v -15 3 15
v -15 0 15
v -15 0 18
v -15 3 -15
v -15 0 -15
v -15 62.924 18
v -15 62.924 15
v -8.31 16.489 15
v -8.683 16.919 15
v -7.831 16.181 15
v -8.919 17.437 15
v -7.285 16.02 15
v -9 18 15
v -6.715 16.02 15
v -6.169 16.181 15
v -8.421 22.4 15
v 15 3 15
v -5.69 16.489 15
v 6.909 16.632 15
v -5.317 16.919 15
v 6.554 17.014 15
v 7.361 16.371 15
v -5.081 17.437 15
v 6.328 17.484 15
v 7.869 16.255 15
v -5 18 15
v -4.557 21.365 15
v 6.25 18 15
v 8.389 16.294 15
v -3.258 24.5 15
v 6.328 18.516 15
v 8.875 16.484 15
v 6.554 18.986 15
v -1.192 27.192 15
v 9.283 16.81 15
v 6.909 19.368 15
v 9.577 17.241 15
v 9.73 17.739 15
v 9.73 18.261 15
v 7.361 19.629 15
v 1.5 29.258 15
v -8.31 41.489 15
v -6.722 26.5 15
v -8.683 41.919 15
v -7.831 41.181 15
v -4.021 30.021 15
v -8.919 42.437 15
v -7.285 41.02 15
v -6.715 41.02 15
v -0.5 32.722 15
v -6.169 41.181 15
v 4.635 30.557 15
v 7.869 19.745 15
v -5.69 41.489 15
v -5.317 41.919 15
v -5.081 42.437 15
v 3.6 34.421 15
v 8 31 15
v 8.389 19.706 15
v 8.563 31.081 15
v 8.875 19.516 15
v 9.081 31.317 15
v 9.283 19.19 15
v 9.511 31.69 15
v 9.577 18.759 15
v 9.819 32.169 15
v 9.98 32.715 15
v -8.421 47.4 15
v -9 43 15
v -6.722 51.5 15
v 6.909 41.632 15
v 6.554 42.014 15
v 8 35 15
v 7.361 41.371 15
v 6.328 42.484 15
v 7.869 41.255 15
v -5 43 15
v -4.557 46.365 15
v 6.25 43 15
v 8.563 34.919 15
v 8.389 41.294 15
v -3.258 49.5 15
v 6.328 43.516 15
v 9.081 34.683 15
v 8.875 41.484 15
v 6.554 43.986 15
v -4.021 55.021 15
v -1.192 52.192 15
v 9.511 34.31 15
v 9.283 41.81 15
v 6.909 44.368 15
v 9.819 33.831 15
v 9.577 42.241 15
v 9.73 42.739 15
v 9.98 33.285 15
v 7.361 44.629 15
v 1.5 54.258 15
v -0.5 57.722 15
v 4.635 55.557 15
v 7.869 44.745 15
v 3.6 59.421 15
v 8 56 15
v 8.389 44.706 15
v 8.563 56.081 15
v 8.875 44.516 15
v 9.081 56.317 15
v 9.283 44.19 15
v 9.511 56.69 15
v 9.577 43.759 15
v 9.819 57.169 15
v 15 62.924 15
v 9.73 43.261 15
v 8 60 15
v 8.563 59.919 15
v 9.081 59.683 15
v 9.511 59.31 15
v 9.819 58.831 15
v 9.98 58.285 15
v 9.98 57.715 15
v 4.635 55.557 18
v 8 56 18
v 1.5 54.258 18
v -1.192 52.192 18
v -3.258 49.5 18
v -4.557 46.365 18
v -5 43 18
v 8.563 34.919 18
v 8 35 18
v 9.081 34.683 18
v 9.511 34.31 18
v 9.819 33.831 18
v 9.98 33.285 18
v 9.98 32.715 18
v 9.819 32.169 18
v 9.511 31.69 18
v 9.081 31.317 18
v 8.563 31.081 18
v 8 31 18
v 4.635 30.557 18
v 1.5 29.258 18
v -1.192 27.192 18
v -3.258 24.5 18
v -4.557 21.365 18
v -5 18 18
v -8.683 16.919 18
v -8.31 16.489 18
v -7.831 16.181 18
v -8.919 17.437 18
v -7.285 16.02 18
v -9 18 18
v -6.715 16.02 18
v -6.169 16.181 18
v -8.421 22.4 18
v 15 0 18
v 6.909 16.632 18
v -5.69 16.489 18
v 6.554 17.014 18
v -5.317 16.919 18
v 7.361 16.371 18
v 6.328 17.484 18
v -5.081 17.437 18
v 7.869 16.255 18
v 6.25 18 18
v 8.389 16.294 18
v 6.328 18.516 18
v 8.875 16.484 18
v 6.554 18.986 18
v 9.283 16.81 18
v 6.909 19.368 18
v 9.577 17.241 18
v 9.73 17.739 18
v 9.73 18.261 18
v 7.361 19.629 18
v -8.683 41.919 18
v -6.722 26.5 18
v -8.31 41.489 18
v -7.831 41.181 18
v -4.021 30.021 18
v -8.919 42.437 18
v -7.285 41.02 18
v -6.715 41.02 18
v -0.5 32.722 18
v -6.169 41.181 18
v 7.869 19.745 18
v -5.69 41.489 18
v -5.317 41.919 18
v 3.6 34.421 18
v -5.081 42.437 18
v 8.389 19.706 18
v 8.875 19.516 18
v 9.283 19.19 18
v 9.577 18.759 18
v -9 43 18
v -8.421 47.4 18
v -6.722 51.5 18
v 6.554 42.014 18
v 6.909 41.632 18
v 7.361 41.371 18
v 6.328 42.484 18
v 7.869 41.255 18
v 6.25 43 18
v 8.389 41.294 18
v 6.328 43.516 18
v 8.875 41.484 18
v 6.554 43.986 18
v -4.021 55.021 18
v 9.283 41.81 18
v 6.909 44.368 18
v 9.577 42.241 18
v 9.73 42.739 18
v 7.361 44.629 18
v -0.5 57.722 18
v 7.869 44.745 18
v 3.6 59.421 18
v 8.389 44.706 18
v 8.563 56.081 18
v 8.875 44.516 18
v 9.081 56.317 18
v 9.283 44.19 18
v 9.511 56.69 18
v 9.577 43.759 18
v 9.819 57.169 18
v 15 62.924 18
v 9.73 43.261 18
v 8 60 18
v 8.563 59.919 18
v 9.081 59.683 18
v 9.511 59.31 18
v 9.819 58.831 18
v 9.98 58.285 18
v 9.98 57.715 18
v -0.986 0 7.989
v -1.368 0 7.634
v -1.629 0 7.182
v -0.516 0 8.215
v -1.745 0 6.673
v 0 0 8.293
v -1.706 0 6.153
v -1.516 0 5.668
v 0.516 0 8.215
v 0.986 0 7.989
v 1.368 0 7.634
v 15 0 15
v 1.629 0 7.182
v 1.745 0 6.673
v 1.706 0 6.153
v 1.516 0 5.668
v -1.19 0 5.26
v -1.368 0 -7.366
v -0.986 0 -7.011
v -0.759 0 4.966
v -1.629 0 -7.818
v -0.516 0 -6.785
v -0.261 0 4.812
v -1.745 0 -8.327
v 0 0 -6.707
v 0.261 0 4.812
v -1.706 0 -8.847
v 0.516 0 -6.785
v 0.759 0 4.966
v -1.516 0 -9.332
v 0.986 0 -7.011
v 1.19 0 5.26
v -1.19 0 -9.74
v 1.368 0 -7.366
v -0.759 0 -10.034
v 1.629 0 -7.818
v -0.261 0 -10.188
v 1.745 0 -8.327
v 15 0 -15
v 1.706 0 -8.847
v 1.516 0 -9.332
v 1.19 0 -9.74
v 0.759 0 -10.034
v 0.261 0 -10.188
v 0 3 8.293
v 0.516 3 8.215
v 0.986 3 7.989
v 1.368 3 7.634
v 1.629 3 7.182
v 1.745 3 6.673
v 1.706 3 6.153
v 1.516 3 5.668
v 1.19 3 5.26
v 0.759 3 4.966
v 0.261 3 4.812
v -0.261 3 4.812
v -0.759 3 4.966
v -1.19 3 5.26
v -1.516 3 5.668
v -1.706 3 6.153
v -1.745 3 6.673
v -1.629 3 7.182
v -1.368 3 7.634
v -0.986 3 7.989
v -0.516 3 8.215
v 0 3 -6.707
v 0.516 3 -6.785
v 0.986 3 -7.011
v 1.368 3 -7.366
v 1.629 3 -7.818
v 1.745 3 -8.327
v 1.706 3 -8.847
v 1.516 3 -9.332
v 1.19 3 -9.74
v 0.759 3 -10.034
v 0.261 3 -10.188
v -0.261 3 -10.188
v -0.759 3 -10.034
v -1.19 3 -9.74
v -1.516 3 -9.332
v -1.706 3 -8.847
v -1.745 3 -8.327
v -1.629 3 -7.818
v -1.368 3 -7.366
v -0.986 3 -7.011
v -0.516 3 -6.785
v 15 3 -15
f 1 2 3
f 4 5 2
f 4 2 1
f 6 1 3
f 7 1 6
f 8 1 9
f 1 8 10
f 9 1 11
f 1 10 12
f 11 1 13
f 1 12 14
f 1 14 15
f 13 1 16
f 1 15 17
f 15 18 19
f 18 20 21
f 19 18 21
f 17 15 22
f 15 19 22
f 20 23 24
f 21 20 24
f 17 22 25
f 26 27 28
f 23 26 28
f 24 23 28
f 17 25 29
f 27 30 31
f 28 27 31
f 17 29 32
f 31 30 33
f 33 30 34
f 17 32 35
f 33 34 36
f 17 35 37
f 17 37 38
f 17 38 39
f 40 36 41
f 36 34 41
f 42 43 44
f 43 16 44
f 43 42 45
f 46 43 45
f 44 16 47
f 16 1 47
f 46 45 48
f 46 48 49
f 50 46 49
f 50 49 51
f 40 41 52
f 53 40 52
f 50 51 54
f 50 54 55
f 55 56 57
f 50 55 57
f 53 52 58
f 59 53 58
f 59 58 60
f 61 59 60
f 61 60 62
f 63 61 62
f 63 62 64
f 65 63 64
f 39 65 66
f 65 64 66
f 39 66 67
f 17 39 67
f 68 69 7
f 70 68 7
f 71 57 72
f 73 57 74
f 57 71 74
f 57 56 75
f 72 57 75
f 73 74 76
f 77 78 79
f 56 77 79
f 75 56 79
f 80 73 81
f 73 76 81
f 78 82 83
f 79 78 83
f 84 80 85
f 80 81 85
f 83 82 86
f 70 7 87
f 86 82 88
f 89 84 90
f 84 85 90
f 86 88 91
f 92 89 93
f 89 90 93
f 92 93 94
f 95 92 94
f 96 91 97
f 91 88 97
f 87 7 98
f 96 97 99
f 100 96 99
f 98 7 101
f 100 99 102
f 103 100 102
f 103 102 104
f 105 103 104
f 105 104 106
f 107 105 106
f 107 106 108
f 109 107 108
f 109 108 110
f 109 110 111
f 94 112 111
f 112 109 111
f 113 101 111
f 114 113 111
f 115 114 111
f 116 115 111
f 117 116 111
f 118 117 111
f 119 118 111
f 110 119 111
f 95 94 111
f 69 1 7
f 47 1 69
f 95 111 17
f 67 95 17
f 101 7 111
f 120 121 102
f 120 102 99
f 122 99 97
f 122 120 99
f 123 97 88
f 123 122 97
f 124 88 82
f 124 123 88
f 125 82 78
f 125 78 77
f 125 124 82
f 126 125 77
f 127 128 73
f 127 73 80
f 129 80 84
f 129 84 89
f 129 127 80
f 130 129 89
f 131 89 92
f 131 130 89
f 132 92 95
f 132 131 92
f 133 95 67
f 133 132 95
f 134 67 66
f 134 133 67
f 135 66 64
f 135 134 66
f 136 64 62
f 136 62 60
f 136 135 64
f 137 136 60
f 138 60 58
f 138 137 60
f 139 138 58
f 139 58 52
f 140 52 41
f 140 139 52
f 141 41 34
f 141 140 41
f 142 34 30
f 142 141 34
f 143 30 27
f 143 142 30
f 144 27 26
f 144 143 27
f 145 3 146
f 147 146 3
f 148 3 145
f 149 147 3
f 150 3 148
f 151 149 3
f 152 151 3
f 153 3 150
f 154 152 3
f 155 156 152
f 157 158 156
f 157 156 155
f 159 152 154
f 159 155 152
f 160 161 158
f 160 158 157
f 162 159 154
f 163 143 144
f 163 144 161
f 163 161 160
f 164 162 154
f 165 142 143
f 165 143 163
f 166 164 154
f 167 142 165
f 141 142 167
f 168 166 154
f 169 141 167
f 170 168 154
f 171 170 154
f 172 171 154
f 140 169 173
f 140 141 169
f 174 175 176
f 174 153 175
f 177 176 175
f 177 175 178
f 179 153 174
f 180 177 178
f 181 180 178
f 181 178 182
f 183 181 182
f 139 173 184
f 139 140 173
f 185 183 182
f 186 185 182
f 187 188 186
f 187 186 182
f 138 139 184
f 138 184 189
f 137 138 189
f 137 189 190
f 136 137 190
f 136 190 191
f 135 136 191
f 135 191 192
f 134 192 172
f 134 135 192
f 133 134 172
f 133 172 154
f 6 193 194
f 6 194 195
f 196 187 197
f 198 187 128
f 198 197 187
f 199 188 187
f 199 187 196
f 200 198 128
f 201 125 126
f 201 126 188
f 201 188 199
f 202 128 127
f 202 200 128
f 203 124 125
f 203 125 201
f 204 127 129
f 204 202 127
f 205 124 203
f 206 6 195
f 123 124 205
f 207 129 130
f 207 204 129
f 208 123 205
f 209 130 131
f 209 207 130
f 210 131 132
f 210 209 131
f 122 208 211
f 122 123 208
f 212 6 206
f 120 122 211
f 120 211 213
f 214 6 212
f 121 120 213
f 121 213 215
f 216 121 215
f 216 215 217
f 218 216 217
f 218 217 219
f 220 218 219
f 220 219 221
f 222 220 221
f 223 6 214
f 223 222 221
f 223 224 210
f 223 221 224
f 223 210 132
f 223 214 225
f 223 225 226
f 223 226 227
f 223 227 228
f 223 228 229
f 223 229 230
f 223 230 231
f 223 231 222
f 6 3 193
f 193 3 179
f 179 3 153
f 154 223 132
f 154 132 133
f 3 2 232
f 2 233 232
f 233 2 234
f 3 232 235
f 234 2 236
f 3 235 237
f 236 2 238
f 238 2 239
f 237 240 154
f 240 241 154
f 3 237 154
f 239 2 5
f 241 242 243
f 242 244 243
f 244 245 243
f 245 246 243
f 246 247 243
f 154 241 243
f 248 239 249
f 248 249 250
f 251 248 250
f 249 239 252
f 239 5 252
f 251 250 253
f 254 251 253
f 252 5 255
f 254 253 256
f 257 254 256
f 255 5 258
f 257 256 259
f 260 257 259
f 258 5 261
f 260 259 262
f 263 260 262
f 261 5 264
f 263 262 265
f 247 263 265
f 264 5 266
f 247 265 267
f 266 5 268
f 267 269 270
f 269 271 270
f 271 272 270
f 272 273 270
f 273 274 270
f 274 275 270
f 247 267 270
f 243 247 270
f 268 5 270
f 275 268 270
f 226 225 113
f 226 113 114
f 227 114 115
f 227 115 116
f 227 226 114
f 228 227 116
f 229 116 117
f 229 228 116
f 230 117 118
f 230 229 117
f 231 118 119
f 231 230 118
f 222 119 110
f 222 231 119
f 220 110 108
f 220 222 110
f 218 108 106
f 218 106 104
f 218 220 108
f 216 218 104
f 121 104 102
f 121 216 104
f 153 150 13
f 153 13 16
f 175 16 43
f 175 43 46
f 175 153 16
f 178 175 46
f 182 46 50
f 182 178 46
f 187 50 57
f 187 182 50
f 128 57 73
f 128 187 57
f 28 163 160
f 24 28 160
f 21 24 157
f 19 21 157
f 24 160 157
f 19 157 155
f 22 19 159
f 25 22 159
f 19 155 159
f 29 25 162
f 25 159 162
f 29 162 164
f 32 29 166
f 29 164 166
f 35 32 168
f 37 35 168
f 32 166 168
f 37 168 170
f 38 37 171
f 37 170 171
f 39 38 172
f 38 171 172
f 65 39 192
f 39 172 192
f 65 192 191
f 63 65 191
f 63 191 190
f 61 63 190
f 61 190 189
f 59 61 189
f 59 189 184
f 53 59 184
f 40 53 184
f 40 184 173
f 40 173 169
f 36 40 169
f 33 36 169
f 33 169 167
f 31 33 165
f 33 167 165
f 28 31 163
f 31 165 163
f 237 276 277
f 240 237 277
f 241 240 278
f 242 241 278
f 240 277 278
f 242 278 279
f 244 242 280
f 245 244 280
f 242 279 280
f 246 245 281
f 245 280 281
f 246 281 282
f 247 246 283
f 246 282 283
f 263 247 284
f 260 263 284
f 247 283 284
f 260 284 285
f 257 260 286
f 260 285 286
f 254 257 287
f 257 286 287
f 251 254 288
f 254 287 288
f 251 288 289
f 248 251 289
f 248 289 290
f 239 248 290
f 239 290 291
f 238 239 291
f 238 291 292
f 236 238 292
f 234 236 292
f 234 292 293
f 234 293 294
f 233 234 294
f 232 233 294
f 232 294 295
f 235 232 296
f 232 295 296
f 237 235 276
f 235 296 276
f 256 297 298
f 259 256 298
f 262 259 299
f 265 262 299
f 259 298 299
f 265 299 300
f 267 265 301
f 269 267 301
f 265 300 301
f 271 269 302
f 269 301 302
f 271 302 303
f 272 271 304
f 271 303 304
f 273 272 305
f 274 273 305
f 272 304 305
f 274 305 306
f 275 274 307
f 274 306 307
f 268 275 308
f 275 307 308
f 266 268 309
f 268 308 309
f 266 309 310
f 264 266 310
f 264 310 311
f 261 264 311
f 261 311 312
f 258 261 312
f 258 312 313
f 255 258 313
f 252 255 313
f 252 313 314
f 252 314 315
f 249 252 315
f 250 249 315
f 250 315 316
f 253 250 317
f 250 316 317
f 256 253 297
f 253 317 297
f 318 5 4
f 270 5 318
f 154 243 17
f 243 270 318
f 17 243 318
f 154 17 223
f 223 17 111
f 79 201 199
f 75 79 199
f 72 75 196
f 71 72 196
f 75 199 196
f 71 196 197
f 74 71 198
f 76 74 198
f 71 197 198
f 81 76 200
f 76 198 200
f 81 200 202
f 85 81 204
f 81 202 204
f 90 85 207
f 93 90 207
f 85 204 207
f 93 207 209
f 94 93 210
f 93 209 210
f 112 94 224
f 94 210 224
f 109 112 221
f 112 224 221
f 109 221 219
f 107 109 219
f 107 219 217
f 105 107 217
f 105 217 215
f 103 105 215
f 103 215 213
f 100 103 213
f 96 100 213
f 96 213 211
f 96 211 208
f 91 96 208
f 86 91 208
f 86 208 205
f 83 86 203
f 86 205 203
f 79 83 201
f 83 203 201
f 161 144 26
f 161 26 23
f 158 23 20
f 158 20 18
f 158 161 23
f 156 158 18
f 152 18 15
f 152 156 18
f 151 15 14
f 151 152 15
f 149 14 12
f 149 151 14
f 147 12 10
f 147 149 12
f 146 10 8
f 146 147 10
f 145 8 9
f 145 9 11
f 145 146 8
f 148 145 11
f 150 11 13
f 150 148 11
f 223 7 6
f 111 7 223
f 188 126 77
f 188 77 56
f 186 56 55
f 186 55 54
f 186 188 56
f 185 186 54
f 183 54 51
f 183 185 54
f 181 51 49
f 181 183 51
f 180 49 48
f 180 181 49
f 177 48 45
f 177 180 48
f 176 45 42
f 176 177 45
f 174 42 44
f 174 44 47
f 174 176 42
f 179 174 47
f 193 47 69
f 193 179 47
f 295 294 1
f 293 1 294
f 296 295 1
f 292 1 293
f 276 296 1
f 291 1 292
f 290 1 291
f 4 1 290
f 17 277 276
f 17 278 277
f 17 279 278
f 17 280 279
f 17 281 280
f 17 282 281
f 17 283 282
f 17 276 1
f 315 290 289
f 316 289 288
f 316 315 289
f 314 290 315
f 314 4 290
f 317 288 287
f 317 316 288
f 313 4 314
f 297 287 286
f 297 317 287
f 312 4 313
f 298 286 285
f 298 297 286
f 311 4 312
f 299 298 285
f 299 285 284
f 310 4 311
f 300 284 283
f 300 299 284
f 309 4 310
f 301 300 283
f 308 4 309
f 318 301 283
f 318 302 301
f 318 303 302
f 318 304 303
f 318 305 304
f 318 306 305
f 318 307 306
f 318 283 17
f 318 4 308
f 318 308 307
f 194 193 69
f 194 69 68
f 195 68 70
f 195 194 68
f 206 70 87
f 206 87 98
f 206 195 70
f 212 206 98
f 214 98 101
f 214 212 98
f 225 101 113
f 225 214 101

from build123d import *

# Parameters (mm, degrees)
SKETCH_1_W          = 30
SKETCH_1_H          = 30
EXTRUDE_1_DEPTH     = 3
SKETCH_2_R          = 1.75
CUT_EXTRUDE_1_DEPTH = 3
SKETCH_3_W          = 30
SKETCH_3_H          = 62.924190463
EXTRUDE_2_DEPTH     = 3
SKETCH_4_R          = 1.75
CUT_EXTRUDE_2_DEPTH = 3


with BuildPart() as part:
    # 草图1 → 凸台-拉伸1 (new body)
    with BuildSketch(Plane(origin=(0, 0, 0), x_dir=(1, 0, 0), z_dir=(0, 1, 0))):
        Rectangle(SKETCH_1_W, SKETCH_1_H)
    extrude(amount=EXTRUDE_1_DEPTH)

    # 草图2 → 切除-拉伸1 (cut)
    with BuildSketch(Plane(origin=(0, 3, 0), x_dir=(1, 0, 0), z_dir=(0, 1, 0))):
        with Locations(Location((0, -6.542683553, 0), (0, 0, 270))):
            Circle(SKETCH_2_R)
        with Locations(Location((0, 8.457316447, 0), (0, 0, 270))):
            Circle(SKETCH_2_R)
    extrude(amount=-CUT_EXTRUDE_1_DEPTH, mode=Mode.SUBTRACT)

    # 草图3 → 凸台-拉伸2 (add)
    with BuildSketch(Plane.XY.offset(15)):
        with Locations((0, 31.462095232)):
            Rectangle(SKETCH_3_W, SKETCH_3_H)
    extrude(amount=EXTRUDE_2_DEPTH)

    # 草图4 → 切除-拉伸2 (cut)
    with BuildSketch(Plane.XY.offset(18)):
        with Locations(Location((8, 43, 0), (0, 0, 180))):
            Circle(SKETCH_4_R)
        with Locations(Location((8, 18, 0), (0, 0, 180))):
            Circle(SKETCH_4_R)
        with BuildLine():
            ThreePointArc((8, 60), (10, 58), (8, 56))
            ThreePointArc((8, 56), (-1.192388155, 52.192388155), (-5, 43))
            ThreePointArc((-5, 43), (-7, 41), (-9, 43))
            ThreePointArc((-9, 43), (-4.02081528, 55.02081528), (8, 60))
        make_face()
        with BuildLine():
            ThreePointArc((-5, 18), (-7, 16), (-9, 18))
            ThreePointArc((-9, 18), (-4.02081528, 30.02081528), (8, 35))
            ThreePointArc((8, 35), (10, 33), (8, 31))
            ThreePointArc((8, 31), (-1.192388155, 27.192388155), (-5, 18))
        make_face()
    extrude(amount=-CUT_EXTRUDE_2_DEPTH, mode=Mode.SUBTRACT)


solid = part.part
